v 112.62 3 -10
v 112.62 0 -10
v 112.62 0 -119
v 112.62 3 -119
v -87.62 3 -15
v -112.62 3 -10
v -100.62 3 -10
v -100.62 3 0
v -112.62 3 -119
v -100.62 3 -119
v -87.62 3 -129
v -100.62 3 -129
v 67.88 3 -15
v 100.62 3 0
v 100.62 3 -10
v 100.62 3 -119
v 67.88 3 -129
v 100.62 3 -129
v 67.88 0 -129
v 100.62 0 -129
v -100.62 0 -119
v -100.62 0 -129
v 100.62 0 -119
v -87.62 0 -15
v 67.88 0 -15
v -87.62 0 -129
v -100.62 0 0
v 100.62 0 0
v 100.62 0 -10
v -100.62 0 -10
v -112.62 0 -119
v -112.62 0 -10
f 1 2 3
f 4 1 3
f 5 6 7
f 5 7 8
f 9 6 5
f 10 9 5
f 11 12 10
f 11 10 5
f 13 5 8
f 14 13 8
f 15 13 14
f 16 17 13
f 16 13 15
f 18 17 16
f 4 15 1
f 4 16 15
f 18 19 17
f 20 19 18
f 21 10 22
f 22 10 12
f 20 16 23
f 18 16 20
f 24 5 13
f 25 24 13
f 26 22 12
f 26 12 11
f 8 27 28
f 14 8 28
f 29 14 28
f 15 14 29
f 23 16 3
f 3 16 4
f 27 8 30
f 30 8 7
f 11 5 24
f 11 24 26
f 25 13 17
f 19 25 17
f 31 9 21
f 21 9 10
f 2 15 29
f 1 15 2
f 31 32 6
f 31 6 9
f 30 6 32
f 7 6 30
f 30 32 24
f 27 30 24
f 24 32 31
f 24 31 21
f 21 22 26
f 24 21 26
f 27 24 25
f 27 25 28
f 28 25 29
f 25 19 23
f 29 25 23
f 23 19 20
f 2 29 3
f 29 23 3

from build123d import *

# Parameters (mm, degrees)
SKETCH1_W           = 225.24
SKETCH1_H           = 129
BOSS_EXTRUDE1_DEPTH = 3
SKETCH2_W           = 12
SKETCH2_H           = 10
SKETCH2_W_2         = 155.5
SKETCH2_H_2         = 114
CUT_EXTRUDE1_DEPTH  = 172.269566473


with BuildPart() as part:
    # Sketch1 → Boss-Extrude1 (new body)
    with BuildSketch(Plane(origin=(0, 0, 0), x_dir=(1, 0, 0), z_dir=(0, 1, 0))):
        with Locations((0, 64.5)):
            Rectangle(SKETCH1_W, SKETCH1_H)
    extrude(amount=BOSS_EXTRUDE1_DEPTH)

    # Sketch2 → Cut-Extrude1 (cut, through all)
    with BuildSketch(Plane(origin=(0, 3, 0), x_dir=(1, 0, 0), z_dir=(0, 1, 0))):
        with Locations((-106.62, 124)):
            Rectangle(SKETCH2_W, SKETCH2_H)
        with Locations((106.62, 124)):
            Rectangle(SKETCH2_W, SKETCH2_H)
        with Locations((106.62, 5)):
            Rectangle(SKETCH2_W, SKETCH2_H)
        with Locations((-106.62, 5)):
            Rectangle(SKETCH2_W, SKETCH2_H)
        with Locations((-9.87, 72)):
            Rectangle(SKETCH2_W_2, SKETCH2_H_2)
    extrude(amount=-CUT_EXTRUDE1_DEPTH, mode=Mode.SUBTRACT)


solid = part.part
